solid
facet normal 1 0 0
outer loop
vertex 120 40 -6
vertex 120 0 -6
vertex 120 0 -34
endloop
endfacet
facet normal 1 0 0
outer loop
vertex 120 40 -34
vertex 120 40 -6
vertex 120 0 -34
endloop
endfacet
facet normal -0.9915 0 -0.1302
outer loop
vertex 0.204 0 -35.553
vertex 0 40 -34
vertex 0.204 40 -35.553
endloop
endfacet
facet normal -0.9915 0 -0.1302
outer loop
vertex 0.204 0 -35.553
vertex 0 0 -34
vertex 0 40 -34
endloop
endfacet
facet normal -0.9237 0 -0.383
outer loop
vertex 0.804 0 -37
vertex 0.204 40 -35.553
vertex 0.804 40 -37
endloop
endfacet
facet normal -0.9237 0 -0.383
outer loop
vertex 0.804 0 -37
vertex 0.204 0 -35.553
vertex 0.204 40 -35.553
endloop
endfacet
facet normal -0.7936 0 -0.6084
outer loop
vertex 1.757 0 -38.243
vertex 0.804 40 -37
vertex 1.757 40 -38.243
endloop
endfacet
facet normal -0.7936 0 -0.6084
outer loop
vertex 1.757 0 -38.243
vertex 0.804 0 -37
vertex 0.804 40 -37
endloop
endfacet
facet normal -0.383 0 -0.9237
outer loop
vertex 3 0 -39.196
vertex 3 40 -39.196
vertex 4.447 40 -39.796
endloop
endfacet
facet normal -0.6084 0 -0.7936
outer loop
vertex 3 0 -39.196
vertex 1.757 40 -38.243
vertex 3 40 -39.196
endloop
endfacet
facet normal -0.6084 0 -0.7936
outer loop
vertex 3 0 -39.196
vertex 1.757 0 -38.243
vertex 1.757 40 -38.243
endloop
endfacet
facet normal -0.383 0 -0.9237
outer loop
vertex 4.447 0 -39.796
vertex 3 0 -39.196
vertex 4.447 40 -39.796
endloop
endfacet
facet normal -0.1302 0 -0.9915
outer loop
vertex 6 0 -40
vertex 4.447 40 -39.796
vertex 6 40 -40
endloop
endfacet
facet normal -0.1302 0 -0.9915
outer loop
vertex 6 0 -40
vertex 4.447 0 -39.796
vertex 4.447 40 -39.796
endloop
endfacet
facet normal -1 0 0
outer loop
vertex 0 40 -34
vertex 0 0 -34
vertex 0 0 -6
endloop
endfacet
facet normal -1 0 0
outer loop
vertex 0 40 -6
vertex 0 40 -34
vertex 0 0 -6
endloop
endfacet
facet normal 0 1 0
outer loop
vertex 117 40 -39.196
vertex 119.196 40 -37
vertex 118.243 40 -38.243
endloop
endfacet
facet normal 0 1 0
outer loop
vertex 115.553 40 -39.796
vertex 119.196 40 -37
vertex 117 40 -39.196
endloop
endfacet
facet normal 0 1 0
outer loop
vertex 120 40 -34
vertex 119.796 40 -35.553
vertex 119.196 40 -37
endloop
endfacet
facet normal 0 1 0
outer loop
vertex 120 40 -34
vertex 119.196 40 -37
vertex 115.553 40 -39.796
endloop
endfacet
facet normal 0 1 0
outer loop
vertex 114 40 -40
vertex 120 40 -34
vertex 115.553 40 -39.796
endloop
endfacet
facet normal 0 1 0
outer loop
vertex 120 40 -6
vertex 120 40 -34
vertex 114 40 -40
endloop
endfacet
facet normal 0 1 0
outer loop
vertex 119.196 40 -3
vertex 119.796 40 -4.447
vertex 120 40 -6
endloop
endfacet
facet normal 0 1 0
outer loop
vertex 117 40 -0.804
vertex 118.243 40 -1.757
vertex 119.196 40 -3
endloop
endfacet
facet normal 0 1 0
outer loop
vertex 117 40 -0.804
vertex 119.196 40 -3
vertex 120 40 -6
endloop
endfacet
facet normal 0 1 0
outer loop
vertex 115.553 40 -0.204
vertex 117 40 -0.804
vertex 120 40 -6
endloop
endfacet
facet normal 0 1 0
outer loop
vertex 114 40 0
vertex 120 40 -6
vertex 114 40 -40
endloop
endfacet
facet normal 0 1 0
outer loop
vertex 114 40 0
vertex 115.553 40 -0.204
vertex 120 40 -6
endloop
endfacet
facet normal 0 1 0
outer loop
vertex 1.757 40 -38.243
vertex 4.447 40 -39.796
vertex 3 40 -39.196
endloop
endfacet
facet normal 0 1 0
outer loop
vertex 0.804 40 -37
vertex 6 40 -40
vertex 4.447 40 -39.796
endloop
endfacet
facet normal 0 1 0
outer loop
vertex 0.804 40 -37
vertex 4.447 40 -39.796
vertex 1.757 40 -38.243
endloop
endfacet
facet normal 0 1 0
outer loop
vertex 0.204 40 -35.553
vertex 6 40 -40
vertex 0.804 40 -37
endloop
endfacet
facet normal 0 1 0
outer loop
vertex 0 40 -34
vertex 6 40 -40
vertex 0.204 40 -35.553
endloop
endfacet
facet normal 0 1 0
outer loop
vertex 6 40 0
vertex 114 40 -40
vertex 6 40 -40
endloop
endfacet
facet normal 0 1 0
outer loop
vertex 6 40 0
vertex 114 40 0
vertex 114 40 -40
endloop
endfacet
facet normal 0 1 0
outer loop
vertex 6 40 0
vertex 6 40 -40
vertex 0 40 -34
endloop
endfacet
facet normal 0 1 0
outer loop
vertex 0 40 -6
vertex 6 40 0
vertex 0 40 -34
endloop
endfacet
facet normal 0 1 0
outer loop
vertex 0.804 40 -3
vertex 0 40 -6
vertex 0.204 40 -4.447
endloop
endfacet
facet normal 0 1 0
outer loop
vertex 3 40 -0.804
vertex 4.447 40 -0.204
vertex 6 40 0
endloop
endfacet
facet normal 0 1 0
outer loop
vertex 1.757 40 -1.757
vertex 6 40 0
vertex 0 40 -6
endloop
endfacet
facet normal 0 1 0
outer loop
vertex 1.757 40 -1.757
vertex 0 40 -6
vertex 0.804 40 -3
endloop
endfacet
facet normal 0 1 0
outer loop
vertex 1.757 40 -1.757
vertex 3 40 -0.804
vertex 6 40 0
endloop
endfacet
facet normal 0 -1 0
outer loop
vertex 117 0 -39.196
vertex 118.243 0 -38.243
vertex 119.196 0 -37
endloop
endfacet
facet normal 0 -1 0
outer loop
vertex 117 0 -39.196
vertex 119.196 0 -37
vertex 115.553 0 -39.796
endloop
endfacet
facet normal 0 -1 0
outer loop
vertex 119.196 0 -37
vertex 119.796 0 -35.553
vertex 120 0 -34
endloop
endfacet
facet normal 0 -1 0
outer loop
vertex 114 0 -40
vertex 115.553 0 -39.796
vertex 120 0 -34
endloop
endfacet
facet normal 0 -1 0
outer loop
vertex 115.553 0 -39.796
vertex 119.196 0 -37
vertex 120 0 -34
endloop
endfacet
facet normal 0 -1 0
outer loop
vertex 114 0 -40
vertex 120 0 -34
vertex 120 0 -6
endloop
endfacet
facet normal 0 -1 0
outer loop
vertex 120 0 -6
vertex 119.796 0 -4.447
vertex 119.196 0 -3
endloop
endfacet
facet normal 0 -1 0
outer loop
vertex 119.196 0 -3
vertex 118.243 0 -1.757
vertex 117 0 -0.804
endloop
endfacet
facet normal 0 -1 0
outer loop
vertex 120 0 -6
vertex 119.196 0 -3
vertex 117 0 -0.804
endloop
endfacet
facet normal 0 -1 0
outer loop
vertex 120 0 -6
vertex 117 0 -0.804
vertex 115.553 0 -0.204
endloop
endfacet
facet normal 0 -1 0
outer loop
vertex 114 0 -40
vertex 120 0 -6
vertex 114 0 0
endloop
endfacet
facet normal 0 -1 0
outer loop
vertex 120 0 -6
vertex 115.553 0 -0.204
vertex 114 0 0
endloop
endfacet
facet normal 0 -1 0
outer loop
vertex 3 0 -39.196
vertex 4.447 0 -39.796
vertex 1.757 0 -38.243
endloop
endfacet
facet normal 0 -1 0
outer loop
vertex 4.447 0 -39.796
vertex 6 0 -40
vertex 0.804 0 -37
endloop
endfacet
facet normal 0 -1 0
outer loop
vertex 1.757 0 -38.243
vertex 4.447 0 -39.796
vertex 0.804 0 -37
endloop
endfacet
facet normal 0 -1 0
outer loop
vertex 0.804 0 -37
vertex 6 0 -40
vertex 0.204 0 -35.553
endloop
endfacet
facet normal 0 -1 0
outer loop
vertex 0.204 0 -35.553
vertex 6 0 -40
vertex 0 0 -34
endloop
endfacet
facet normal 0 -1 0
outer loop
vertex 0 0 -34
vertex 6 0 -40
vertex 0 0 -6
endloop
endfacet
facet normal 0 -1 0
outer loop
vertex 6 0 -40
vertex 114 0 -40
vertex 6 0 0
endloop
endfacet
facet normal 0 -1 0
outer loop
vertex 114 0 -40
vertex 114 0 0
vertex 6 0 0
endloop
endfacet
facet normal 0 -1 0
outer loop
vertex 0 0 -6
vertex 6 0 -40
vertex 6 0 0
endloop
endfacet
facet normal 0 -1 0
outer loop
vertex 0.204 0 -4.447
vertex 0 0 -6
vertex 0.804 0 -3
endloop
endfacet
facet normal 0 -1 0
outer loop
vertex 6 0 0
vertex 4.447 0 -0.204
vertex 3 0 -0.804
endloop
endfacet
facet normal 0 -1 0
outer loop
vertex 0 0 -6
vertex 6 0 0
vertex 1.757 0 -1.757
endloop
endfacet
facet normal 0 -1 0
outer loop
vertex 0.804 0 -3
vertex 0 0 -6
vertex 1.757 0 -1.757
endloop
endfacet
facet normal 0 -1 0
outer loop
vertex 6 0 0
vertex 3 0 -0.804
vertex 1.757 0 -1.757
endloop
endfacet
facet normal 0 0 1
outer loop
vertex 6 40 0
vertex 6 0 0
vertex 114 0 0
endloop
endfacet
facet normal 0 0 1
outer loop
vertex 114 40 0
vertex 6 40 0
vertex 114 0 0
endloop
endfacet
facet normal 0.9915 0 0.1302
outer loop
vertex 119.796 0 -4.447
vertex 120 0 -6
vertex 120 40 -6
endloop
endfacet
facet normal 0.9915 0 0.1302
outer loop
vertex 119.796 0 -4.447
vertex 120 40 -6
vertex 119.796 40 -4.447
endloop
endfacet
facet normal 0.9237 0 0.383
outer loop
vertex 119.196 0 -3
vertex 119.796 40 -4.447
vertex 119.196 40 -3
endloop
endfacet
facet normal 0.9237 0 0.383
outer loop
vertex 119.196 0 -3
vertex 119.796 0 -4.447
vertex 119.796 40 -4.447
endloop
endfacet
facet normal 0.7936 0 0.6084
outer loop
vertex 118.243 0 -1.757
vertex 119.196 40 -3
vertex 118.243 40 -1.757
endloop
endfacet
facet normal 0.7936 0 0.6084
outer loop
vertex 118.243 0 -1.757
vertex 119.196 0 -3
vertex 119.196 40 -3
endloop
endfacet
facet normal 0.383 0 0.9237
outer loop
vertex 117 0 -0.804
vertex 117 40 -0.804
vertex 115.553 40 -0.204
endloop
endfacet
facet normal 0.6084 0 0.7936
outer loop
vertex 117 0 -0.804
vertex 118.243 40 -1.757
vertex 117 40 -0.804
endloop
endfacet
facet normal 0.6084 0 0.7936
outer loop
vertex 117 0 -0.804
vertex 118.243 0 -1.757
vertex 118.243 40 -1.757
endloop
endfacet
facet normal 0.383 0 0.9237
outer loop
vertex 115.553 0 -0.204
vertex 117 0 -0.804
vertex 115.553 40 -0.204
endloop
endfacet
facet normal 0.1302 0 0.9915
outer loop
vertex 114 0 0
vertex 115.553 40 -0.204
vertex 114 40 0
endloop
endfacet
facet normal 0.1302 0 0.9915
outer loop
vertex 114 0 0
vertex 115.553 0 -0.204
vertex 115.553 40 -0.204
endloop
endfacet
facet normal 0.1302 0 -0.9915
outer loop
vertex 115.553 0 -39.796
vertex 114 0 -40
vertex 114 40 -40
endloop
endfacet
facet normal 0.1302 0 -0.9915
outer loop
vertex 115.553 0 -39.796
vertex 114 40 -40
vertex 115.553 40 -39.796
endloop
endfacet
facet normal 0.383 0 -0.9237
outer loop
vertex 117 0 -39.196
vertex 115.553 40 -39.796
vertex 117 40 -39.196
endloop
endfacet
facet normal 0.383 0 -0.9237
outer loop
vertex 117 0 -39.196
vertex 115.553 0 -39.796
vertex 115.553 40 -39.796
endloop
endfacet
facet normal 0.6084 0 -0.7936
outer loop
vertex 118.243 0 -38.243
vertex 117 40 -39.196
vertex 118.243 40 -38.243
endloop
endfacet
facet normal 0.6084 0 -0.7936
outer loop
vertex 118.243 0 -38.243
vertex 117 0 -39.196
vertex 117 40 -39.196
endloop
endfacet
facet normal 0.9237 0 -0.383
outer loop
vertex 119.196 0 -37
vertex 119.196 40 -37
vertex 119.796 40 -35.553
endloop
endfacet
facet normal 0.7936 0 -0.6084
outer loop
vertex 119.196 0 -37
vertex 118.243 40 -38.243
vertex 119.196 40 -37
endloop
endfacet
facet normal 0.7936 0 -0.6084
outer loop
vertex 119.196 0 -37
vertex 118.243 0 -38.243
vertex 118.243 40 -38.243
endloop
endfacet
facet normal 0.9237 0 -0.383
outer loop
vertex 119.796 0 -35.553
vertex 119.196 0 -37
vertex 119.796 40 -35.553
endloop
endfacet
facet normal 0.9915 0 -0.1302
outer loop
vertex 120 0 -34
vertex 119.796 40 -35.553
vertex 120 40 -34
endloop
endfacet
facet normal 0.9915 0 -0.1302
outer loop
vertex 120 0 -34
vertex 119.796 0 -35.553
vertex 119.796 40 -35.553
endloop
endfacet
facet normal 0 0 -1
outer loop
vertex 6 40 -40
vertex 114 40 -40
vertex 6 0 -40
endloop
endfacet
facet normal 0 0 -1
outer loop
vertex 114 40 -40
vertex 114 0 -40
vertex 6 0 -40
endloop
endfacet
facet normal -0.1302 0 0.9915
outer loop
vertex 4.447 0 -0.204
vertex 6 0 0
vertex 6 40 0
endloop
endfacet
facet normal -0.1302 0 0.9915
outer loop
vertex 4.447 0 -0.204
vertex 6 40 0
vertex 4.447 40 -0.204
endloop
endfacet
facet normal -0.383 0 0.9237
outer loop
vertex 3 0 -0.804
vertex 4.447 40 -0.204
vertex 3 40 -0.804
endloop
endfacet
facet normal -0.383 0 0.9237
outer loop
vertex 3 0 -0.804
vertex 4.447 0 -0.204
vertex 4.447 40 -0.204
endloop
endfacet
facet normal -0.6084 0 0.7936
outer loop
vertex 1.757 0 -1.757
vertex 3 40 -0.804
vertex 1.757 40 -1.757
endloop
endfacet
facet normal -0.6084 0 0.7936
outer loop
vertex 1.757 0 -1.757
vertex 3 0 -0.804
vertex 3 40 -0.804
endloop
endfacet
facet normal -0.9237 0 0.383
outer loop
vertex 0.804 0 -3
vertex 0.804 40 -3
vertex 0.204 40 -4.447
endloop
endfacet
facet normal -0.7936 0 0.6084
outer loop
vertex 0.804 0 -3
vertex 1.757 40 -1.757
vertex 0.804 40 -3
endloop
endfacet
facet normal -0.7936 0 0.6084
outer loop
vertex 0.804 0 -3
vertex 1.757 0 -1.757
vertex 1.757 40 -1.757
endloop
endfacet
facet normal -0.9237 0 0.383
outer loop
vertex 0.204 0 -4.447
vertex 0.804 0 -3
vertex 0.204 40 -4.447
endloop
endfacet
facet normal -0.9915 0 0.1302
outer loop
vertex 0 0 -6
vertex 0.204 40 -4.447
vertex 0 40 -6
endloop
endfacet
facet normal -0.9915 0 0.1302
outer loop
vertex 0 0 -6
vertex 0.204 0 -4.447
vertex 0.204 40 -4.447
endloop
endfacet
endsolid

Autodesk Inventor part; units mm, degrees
ref_plane "YZ Plane" through (0, 0, 0) normal (1, 0, 0) x (0, 1, 0)
ref_plane "XZ Plane" through (0, 0, 0) normal (0, 1, 0) x (-1, 0, 0)
ref_plane "XY Plane" through (0, 0, 0) normal (0, 0, 1) x (1, 0, 0)
sketch "Sketch1" plane through (0, 0, 0) normal (0, 1, 0) x (-1, 0, 0)
  line L0 (-6, 0) -> (-114, 0)
  line L1 (-120, -6) -> (-120, -34)
  line L2 (-114, -40) -> (-6, -40)
  line L3 (0, -34) -> (0, -6)
  line L4 (0, 0) -> (108, 0) construction
  arc A0 (0, -6) -> (-6, 0) centre (-6, -6) ccw
  arc A1 (-6, -40) -> (0, -34) centre (-6, -34) ccw
  arc A2 (-120, -34) -> (-114, -40) centre (-114, -34) ccw
  arc A3 (-114, 0) -> (-120, -6) centre (-114, -6) ccw
  point P0 (-120, 0)
  point P1 (-120, -40)
  dimension "d0" = 120
  dimension "d1" = 180
  dimension "d2" = 40
  dimension "d3" = 6
extrude "Extrusion1" add sketch "Sketch1" along normal blind 40
properties part number "batt"
